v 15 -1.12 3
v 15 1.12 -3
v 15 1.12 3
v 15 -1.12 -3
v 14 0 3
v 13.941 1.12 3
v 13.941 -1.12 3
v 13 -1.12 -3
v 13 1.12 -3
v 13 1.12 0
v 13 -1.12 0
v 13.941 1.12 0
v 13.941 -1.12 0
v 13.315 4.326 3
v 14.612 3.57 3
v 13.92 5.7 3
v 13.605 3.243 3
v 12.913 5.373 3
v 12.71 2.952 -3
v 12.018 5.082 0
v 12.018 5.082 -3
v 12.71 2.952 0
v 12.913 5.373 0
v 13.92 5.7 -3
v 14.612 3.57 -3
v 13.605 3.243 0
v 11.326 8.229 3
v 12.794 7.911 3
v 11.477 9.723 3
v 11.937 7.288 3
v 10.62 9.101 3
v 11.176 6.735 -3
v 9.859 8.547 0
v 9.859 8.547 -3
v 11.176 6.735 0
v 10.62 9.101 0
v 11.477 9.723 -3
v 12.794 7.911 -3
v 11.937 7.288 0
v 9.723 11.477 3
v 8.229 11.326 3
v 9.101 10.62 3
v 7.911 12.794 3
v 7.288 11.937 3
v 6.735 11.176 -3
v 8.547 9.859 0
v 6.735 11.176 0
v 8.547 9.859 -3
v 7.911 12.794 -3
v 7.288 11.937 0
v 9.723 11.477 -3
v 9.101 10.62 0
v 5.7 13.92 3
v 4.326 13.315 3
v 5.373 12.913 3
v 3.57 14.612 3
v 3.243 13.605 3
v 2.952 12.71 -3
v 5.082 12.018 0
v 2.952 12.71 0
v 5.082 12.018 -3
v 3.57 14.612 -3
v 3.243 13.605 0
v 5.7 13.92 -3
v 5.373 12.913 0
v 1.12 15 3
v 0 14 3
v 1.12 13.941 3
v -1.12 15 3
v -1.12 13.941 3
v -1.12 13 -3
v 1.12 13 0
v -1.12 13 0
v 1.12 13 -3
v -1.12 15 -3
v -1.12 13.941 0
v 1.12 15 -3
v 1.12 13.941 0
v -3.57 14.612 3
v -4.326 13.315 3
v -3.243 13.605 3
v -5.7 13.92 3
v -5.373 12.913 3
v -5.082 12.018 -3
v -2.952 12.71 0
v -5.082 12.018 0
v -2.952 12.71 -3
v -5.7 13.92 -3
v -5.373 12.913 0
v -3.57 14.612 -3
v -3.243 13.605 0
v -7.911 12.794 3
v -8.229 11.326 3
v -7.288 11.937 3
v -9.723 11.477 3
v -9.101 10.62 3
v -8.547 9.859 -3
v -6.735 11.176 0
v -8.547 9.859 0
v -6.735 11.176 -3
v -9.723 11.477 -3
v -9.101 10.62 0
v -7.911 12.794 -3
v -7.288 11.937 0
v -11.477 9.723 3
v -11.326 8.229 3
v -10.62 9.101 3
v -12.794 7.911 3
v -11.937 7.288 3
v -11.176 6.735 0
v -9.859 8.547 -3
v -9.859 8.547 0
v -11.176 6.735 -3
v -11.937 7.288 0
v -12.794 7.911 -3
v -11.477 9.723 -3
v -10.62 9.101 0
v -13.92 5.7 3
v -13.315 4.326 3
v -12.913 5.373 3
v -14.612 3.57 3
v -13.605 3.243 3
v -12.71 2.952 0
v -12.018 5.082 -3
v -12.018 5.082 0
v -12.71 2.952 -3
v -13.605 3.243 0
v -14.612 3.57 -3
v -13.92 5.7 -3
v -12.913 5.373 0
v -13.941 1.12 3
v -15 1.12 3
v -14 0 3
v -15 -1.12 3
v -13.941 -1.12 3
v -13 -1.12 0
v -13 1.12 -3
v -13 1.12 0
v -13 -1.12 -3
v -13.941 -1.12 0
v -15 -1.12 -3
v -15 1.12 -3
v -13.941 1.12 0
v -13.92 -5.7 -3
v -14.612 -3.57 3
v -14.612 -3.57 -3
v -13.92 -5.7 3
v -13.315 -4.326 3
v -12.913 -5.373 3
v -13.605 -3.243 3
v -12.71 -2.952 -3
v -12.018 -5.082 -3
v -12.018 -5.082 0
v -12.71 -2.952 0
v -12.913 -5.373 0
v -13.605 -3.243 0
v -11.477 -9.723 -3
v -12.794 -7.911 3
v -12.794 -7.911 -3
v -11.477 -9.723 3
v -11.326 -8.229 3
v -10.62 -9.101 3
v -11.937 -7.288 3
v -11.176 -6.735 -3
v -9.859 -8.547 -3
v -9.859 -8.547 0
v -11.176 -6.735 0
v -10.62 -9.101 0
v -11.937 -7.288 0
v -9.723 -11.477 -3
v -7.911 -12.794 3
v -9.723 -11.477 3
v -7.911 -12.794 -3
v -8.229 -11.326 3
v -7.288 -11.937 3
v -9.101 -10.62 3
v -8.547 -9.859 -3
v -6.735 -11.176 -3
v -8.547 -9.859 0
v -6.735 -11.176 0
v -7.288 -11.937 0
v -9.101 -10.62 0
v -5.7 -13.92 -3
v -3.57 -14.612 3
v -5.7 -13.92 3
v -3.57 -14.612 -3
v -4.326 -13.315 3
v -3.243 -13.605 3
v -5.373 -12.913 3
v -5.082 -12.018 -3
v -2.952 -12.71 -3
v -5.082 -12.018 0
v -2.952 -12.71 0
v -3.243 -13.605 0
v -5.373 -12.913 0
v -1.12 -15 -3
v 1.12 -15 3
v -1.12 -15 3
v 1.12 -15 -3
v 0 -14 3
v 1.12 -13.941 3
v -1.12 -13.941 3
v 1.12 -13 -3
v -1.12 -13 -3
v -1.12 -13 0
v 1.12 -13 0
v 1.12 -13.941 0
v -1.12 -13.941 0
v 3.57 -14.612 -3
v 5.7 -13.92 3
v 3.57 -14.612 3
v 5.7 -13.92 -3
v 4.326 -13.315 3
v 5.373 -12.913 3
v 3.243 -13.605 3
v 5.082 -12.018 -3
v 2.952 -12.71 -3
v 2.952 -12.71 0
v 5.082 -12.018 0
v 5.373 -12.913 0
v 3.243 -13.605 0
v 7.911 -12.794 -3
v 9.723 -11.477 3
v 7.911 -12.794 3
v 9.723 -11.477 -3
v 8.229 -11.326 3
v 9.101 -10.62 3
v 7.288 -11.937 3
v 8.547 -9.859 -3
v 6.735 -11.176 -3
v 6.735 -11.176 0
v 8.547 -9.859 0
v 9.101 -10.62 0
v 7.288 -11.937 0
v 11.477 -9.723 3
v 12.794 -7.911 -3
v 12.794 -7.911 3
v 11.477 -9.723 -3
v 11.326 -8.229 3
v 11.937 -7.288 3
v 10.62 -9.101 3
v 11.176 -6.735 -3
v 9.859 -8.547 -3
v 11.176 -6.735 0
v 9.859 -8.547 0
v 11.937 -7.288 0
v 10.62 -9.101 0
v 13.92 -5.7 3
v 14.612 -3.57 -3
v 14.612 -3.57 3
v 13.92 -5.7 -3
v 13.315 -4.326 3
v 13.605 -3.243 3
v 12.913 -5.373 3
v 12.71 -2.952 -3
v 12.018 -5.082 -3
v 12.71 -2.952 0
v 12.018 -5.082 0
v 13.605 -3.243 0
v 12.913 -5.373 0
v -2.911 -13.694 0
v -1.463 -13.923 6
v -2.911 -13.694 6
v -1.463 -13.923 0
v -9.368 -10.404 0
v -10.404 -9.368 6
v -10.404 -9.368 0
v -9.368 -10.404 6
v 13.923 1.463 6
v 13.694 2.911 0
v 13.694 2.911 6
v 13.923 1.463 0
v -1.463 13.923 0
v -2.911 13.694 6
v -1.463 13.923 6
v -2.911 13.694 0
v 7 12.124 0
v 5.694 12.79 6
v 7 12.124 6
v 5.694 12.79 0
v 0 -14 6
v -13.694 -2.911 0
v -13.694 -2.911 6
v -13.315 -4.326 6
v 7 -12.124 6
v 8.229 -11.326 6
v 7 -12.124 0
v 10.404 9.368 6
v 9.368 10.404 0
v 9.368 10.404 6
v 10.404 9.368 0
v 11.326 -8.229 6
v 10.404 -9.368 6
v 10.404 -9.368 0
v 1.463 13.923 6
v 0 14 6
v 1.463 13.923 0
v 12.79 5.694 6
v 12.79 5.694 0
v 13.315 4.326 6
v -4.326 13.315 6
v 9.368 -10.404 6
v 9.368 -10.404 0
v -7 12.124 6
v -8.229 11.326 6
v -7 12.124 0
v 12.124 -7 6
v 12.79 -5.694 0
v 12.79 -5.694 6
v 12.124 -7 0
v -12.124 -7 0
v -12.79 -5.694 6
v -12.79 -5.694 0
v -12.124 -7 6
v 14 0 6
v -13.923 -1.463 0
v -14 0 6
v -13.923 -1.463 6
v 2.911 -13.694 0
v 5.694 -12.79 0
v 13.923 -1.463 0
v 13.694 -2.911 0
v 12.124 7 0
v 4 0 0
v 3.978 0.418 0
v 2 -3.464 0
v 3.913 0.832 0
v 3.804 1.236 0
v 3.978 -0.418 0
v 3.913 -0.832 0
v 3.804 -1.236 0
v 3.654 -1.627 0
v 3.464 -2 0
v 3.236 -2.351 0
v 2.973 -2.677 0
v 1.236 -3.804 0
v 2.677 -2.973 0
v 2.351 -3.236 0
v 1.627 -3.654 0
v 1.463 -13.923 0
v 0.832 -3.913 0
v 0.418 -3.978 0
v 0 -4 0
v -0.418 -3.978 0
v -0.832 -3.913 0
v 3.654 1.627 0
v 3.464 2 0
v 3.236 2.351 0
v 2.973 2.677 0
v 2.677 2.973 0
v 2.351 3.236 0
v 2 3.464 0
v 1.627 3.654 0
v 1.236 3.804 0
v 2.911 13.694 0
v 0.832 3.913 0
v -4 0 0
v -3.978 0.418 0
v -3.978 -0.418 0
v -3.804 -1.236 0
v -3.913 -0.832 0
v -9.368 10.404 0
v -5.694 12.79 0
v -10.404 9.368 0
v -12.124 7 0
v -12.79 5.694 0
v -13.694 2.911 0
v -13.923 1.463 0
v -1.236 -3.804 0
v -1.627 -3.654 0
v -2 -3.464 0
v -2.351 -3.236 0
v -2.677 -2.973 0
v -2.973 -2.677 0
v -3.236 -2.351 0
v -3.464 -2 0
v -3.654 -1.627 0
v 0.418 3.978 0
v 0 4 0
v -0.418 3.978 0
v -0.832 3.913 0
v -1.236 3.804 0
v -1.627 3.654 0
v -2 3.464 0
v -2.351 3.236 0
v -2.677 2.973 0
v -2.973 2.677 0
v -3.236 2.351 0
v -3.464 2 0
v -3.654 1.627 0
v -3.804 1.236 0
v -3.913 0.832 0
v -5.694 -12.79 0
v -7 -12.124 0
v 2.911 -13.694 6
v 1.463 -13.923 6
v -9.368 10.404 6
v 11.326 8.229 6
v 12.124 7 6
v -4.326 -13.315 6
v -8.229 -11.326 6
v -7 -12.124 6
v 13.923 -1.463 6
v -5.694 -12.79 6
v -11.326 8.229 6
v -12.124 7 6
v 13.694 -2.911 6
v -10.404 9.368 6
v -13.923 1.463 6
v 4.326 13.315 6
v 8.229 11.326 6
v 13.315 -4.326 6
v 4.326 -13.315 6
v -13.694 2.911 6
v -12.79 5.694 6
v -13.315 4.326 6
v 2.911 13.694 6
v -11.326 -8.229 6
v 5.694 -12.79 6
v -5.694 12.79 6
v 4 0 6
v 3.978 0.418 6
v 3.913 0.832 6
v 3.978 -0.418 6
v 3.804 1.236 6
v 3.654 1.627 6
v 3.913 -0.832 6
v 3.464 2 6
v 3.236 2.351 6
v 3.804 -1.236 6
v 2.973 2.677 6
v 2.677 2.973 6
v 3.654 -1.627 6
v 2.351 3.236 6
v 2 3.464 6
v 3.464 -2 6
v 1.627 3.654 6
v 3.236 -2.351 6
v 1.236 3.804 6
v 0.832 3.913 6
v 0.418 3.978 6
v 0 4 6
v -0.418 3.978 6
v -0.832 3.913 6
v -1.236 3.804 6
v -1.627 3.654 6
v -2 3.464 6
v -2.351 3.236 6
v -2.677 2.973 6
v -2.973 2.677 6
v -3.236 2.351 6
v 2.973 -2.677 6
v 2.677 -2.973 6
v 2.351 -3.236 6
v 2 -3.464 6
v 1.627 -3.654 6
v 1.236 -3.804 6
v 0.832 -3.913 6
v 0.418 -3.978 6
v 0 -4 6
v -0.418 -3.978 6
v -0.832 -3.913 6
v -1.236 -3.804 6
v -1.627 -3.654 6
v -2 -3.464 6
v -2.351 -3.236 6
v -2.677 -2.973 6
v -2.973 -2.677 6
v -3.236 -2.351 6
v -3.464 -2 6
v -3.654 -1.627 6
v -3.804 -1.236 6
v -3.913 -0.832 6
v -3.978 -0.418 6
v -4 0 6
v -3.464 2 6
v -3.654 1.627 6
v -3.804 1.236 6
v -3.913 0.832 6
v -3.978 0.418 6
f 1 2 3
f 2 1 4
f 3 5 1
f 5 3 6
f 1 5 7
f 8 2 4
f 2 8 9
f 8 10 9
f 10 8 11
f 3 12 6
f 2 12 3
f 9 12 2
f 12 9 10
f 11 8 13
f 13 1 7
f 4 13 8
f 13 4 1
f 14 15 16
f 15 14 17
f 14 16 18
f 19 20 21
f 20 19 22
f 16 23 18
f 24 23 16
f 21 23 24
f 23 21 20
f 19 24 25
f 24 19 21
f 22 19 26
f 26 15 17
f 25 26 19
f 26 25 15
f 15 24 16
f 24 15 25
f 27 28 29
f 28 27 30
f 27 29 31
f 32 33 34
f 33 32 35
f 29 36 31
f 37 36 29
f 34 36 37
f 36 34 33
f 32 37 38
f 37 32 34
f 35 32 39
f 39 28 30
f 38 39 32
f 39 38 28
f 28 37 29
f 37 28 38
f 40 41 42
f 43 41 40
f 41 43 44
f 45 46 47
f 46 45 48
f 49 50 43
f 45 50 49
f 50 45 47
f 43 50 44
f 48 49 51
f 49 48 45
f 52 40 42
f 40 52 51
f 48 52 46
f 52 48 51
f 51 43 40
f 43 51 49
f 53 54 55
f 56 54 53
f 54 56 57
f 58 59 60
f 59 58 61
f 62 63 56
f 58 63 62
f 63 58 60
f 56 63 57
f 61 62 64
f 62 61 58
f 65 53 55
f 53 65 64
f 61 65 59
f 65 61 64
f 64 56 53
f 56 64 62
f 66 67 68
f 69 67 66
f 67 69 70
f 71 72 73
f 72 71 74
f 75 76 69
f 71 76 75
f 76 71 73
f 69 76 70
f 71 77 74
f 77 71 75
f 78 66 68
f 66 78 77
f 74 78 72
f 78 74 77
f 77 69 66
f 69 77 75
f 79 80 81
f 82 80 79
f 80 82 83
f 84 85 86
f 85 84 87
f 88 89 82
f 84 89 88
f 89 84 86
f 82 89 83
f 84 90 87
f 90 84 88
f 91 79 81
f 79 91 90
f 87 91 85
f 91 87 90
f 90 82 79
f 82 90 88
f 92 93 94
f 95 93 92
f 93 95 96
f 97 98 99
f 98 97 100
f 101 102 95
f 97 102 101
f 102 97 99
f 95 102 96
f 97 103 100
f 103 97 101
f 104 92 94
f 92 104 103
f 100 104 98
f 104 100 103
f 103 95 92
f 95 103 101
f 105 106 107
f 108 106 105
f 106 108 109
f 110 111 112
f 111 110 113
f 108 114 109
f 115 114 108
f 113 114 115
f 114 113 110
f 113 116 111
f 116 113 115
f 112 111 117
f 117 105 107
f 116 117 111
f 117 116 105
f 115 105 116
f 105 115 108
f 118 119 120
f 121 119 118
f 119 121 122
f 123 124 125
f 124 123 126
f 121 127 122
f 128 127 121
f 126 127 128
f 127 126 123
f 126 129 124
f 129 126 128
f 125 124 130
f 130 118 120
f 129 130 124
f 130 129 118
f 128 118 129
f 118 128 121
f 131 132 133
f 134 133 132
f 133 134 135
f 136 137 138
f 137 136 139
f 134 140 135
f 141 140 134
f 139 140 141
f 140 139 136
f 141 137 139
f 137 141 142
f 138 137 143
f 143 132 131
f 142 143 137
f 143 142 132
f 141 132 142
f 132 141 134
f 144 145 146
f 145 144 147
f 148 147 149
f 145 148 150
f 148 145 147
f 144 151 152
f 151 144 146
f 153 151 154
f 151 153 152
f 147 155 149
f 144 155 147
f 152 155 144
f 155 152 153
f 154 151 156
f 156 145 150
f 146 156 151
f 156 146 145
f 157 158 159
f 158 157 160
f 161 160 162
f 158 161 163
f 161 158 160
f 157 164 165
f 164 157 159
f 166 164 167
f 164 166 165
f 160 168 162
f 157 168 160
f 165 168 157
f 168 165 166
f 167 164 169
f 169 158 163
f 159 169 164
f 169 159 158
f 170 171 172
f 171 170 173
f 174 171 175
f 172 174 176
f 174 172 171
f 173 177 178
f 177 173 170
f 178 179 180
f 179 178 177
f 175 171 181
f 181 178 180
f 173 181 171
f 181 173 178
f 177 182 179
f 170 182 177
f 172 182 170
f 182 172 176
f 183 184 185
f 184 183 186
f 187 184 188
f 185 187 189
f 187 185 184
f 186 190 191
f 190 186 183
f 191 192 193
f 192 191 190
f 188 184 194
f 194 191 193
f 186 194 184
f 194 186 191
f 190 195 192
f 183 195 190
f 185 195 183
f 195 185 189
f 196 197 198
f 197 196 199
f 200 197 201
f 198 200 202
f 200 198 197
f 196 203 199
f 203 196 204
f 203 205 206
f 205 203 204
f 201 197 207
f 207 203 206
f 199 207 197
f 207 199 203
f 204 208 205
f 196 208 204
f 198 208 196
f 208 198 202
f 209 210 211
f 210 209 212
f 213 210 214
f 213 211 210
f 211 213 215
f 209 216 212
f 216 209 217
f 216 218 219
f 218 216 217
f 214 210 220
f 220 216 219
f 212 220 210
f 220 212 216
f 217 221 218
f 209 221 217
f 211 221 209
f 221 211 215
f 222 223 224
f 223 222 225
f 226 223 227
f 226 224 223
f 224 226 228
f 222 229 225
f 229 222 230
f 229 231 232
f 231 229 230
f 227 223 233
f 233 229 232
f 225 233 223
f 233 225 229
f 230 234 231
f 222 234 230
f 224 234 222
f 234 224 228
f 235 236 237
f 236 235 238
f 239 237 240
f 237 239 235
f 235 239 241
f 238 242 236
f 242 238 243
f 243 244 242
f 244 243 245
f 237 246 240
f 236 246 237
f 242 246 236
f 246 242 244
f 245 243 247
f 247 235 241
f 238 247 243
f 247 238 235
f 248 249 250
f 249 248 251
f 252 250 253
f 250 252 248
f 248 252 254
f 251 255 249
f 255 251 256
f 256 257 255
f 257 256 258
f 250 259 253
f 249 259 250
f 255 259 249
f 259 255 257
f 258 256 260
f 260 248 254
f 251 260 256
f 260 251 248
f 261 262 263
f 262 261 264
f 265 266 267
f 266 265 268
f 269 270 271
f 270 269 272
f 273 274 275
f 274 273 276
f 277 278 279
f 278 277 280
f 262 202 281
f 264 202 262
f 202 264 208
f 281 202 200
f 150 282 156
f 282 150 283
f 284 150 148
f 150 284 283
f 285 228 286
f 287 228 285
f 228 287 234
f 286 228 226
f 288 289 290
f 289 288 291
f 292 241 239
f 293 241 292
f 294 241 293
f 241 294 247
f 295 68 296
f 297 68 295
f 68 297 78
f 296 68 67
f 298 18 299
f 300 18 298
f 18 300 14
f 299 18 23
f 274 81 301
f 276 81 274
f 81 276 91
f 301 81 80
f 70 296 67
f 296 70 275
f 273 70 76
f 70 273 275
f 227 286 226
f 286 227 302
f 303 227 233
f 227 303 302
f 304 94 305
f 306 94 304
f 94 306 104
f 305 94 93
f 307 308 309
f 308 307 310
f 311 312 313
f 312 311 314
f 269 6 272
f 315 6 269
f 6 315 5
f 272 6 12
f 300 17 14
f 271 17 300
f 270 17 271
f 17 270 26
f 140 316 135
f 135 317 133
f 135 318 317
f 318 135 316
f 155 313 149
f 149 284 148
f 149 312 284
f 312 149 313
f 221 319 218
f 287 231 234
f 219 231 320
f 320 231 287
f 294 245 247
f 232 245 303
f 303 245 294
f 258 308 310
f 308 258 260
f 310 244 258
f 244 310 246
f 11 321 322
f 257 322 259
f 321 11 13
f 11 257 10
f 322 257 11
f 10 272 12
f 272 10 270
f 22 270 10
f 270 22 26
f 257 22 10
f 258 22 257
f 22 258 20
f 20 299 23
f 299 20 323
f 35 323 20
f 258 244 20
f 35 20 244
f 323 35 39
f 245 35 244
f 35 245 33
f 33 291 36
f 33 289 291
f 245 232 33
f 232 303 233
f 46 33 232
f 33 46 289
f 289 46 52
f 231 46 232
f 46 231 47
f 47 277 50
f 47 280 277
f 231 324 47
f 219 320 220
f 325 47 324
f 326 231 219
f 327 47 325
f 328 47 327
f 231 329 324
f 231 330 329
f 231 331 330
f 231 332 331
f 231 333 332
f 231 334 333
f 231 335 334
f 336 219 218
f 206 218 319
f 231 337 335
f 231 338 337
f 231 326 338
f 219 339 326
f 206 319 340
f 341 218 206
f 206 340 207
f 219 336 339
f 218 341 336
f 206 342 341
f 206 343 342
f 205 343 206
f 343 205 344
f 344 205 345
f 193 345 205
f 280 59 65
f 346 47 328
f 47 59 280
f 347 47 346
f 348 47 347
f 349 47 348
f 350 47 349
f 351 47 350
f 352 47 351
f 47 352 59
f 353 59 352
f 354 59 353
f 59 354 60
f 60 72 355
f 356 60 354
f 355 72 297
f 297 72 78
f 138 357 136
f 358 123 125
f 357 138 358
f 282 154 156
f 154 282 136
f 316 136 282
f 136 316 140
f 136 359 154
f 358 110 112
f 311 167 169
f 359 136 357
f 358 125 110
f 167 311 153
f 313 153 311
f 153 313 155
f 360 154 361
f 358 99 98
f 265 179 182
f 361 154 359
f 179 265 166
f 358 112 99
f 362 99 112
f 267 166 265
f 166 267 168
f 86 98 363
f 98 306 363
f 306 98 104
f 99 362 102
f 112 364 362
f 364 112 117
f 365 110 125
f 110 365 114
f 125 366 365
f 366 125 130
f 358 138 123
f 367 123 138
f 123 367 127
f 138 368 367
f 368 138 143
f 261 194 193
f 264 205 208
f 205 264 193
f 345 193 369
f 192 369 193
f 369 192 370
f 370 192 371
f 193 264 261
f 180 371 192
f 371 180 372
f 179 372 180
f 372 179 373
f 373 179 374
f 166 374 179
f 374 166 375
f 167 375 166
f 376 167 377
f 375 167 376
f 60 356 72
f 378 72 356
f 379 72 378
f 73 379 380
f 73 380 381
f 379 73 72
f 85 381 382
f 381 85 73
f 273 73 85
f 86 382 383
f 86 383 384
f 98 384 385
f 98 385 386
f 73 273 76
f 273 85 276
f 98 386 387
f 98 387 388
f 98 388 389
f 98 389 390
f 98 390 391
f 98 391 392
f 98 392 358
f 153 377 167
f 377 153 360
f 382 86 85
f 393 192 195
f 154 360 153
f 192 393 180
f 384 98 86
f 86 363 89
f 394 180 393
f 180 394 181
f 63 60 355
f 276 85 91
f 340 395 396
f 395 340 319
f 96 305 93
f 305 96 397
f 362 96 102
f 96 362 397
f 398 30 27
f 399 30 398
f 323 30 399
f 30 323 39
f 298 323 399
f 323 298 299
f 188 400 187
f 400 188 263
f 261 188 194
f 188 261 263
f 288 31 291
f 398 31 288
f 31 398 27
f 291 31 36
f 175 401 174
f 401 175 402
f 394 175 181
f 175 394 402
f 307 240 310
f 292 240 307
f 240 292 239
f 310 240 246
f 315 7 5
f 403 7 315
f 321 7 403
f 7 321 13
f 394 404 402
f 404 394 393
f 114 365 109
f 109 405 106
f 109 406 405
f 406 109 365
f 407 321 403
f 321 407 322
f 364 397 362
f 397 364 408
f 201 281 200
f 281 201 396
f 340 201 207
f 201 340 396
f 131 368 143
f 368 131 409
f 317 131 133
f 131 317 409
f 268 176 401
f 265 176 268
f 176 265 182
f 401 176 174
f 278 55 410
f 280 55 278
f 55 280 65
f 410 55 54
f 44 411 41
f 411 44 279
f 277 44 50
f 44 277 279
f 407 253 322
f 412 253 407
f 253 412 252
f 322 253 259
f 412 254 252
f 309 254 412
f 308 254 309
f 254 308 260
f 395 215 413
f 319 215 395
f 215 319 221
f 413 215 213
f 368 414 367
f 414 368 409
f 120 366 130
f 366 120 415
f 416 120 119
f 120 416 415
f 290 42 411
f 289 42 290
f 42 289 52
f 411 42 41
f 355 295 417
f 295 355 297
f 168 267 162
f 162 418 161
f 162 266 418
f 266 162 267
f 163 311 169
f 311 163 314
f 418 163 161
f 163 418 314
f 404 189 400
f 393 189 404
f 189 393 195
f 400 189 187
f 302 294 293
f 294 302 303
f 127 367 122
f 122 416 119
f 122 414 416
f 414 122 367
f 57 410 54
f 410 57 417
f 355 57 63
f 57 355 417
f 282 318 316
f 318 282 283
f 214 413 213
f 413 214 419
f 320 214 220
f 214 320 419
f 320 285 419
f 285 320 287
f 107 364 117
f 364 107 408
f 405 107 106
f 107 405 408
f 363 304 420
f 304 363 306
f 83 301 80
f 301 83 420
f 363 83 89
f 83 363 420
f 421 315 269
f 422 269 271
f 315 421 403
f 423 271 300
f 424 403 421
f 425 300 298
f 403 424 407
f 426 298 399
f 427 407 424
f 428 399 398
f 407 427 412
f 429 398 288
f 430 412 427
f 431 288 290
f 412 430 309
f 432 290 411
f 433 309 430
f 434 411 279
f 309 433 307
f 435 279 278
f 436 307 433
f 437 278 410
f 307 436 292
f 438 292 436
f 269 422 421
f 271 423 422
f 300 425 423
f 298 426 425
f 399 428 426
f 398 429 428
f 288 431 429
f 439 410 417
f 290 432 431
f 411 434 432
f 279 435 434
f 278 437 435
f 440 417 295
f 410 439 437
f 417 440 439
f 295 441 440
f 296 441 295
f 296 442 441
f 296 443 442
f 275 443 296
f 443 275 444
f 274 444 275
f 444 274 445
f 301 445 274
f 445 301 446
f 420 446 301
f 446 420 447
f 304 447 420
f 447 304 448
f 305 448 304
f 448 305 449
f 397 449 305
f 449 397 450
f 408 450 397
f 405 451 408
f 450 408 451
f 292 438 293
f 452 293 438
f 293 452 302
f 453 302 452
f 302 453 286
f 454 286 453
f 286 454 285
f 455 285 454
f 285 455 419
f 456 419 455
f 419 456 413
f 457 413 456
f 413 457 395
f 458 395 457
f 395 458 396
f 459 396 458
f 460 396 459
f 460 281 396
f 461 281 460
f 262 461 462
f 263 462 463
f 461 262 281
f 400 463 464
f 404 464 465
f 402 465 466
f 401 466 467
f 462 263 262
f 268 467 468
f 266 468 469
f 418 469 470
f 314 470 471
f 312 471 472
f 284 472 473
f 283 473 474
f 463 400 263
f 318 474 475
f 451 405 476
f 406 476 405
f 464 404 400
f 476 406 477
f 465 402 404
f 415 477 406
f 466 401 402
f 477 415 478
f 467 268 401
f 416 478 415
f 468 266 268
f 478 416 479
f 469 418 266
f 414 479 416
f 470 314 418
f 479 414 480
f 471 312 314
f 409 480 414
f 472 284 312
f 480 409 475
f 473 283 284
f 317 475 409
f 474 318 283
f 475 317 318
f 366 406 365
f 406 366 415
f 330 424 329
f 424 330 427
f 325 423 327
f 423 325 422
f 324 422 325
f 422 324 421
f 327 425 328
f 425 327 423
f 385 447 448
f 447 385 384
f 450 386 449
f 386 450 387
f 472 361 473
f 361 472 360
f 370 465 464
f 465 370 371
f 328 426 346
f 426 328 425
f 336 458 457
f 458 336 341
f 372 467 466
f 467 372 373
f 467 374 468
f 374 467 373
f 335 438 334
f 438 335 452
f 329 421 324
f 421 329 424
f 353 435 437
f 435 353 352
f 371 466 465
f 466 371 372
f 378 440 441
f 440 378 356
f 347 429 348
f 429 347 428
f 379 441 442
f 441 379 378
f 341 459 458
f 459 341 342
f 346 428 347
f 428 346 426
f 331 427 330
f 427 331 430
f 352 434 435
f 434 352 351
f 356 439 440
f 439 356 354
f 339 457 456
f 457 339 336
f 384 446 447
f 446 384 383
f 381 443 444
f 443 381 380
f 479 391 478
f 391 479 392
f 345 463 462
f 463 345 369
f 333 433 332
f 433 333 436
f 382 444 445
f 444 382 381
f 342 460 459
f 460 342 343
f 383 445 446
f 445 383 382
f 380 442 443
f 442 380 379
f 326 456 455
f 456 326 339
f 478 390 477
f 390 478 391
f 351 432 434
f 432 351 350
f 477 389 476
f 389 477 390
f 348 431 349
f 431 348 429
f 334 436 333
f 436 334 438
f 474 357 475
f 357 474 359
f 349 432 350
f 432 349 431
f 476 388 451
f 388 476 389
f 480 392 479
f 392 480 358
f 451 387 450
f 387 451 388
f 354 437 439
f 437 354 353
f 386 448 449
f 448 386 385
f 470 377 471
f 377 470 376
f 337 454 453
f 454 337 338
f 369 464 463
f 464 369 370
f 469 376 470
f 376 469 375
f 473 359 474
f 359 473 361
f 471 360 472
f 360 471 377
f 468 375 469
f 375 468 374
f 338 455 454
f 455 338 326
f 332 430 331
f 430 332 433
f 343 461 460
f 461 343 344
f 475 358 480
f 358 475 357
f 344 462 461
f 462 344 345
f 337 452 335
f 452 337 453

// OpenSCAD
// Gear blank with external locator teeth.
$fn = 60;
eps = 0.02;
bore_d = 8;
root_d = 28;
teeth = 20;
thickness = 6;
difference() { union() { cylinder(d=root_d,h=thickness); for(i=[0:teeth-1]) rotate([0,0,i*360/teeth]) translate([root_d/2,0,0]) cube([2,max(2,root_d*0.08),thickness],center=true); } translate([0,0,-eps]) cylinder(d=bore_d,h=thickness+2*eps); }
